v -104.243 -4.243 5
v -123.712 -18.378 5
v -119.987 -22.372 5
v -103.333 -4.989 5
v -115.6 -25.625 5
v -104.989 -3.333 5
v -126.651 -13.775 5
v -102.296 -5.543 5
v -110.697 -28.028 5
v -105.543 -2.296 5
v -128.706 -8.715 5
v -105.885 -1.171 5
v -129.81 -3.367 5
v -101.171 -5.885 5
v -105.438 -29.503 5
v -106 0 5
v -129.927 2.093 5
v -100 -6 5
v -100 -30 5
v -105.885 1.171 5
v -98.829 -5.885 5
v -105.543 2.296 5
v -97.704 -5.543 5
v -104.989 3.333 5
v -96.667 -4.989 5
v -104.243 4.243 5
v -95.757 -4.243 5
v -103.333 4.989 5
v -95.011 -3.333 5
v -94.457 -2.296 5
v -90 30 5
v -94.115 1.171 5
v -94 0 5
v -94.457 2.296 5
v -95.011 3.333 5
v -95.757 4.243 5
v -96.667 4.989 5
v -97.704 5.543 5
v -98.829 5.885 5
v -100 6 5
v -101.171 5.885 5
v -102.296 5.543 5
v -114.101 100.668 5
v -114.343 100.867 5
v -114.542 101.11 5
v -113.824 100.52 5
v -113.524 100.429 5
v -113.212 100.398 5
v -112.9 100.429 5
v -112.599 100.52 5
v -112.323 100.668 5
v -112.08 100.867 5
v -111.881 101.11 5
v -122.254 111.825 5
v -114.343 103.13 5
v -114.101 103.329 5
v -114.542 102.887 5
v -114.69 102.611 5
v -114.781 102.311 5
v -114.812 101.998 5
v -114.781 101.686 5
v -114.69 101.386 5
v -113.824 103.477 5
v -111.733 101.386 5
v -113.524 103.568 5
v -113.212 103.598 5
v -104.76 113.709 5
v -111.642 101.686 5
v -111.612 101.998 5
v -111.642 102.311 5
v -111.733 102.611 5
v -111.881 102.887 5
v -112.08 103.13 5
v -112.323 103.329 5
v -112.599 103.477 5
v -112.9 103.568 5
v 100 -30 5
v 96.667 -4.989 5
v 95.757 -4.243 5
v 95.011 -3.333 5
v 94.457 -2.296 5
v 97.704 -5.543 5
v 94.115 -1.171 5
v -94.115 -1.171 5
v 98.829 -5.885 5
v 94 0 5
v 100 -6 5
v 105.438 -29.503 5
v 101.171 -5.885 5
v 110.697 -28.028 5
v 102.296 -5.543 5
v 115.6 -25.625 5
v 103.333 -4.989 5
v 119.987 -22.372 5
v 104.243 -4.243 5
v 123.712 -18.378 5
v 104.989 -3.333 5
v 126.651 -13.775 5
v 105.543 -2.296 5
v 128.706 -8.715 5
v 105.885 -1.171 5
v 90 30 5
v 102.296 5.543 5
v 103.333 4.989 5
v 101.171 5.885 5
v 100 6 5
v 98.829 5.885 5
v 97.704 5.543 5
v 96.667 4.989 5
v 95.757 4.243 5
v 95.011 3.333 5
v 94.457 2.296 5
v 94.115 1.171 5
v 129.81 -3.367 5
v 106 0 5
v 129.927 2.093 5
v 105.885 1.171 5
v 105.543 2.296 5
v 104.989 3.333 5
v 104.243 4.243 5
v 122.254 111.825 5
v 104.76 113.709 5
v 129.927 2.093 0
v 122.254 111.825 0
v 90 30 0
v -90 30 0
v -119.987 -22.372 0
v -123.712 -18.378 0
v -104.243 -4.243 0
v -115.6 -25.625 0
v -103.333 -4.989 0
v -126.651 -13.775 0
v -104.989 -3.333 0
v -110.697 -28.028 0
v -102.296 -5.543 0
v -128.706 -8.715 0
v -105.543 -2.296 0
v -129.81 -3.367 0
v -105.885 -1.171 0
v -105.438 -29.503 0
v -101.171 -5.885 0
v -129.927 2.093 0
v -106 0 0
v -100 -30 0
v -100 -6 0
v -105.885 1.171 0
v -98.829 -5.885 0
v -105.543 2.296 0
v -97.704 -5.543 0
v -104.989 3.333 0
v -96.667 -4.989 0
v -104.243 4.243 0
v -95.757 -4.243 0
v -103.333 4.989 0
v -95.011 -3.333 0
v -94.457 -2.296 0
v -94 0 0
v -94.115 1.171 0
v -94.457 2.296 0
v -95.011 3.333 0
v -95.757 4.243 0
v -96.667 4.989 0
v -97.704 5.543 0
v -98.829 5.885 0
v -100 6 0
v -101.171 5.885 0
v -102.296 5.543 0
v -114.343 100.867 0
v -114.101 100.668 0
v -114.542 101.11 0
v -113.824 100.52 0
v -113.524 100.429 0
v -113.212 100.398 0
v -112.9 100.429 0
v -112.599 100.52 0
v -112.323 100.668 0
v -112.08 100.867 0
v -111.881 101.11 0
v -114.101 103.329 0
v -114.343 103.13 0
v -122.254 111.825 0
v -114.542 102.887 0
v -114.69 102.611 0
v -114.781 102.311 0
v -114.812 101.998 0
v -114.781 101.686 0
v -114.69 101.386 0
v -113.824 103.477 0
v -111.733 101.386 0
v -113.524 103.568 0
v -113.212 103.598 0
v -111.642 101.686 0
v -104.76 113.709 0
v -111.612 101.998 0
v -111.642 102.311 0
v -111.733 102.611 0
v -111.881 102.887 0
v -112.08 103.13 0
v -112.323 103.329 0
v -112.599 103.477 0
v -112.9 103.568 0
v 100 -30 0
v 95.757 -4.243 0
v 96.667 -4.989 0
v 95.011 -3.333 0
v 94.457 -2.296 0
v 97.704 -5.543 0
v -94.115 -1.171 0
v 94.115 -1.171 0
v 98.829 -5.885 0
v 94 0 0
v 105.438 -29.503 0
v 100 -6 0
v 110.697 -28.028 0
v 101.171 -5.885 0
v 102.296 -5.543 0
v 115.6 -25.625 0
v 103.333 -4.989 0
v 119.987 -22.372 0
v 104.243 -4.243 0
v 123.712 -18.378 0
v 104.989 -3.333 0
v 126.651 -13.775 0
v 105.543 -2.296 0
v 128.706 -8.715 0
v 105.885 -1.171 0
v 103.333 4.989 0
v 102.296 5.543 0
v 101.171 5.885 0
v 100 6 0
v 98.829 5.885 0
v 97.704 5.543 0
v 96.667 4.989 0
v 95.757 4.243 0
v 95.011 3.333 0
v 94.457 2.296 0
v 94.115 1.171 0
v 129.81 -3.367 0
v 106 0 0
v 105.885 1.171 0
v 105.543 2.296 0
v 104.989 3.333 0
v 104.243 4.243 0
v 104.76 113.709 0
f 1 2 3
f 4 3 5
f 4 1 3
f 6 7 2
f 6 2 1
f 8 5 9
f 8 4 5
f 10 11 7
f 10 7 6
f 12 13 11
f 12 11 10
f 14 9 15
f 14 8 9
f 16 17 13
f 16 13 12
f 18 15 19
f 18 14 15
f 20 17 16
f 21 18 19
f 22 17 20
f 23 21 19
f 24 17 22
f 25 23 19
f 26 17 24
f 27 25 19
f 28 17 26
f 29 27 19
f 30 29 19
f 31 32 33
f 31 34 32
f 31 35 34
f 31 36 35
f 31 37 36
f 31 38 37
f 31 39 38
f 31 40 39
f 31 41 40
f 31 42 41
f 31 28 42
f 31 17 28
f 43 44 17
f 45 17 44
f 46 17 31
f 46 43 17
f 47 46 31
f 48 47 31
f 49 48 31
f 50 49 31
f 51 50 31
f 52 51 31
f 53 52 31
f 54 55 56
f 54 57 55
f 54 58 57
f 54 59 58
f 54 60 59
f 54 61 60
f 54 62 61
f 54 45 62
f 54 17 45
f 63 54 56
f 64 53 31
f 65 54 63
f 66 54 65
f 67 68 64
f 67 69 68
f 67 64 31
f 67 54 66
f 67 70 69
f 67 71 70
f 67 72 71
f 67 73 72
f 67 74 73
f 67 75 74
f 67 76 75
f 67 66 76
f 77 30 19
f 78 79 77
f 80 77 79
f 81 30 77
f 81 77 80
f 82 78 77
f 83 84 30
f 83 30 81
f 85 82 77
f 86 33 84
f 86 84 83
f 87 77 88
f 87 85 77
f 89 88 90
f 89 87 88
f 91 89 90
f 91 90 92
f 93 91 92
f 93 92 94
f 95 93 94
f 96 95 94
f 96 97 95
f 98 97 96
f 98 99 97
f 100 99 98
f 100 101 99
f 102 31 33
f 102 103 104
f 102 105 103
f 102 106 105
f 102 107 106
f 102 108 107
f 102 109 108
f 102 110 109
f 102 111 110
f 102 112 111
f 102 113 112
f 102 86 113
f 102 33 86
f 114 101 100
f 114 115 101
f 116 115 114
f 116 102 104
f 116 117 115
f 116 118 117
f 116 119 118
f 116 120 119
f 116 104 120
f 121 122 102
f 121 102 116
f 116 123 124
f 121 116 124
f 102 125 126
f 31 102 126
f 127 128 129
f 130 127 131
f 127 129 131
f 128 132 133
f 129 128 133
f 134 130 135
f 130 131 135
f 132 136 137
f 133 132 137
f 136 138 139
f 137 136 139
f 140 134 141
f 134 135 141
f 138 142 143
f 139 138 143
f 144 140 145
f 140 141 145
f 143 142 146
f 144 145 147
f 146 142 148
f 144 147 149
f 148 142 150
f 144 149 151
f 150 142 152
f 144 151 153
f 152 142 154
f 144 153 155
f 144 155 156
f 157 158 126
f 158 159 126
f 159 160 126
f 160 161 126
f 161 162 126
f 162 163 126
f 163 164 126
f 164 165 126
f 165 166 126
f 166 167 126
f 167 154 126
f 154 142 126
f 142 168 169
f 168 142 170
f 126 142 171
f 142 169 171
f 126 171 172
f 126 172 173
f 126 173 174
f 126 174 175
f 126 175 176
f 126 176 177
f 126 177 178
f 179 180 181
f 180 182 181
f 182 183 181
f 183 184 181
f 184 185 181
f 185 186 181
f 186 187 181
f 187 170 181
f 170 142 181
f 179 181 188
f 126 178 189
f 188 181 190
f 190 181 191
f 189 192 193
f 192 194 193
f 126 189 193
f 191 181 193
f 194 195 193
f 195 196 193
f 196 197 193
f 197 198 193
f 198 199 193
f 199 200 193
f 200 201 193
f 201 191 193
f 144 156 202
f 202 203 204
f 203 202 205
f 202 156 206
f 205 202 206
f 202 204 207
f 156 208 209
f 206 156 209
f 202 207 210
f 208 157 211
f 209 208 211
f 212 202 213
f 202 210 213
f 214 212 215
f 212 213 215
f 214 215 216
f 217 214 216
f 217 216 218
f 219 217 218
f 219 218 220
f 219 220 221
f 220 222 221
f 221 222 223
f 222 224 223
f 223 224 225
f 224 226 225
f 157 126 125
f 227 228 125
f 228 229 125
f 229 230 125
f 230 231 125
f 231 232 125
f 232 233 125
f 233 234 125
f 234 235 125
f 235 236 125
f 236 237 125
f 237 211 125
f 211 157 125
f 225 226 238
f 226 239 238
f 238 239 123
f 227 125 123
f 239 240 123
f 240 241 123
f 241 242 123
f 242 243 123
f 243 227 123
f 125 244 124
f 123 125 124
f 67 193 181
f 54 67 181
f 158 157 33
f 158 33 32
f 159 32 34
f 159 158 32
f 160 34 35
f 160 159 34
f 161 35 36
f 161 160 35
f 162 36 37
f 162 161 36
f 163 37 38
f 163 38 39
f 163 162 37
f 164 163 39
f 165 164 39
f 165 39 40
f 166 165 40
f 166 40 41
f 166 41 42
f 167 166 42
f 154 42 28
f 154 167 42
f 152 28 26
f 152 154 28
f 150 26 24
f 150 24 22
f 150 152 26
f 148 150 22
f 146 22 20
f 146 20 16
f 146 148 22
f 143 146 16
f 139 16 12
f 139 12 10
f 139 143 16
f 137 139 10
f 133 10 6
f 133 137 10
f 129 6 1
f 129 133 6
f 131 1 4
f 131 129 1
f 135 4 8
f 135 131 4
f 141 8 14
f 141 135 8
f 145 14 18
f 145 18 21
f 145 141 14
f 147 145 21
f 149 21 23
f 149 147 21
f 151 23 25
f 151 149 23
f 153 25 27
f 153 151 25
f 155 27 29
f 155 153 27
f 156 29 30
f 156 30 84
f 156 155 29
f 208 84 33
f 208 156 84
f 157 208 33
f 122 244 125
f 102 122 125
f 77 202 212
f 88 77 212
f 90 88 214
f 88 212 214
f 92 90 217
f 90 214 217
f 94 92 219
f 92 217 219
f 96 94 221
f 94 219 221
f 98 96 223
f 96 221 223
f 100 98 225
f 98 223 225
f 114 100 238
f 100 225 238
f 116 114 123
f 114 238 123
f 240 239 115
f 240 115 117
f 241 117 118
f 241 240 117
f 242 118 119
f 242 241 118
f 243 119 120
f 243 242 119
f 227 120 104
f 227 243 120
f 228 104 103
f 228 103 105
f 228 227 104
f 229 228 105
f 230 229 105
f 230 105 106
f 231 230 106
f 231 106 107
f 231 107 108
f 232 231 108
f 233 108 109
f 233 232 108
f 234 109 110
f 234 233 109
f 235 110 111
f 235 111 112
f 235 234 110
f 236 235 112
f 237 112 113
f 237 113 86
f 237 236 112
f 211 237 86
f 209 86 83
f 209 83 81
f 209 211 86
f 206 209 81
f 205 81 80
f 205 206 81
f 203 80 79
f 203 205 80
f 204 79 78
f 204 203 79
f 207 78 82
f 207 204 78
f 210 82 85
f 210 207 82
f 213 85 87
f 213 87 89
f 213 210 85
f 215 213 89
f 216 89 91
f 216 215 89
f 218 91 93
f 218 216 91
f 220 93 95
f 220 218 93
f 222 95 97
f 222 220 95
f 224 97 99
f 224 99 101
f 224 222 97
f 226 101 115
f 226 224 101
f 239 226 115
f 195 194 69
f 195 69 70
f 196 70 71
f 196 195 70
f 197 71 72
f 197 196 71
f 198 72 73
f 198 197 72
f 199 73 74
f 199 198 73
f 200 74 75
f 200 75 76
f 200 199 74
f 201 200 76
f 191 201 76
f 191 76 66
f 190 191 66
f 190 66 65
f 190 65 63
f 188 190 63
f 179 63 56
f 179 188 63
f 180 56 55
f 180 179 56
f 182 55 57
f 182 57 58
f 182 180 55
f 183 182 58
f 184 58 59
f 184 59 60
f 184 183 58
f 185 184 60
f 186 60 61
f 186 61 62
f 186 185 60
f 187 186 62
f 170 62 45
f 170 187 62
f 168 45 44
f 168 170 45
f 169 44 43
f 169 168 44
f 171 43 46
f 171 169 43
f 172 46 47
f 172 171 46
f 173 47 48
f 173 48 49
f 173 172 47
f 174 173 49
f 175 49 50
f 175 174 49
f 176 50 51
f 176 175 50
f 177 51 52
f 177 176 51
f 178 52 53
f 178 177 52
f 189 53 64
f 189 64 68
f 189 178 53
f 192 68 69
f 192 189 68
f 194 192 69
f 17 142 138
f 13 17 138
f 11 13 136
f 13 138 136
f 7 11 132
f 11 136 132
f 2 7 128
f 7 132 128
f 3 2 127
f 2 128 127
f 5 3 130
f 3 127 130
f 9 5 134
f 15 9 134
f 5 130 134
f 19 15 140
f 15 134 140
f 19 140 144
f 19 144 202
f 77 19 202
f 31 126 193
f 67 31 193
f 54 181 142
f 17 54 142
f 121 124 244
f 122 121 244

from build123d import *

# Parameters (mm, degrees)
SKETCH1_R           = 1.6
SKETCH1_R_2         = 6
BOSS_EXTRUDE1_DEPTH = 5


with BuildPart() as part:
    # Sketch1 → Boss-Extrude1 (new body)
    with BuildSketch(Plane.XY):
        with BuildLine():
            Line((90, 30), (-90, 30))
            Line((-90, 30), (-104.760095102, 113.708659006))
            Line((-104.760095102, 113.708659006), (-122.253709396, 111.824739741))
            Line((-122.253709396, 111.824739741), (-129.926921508, 2.092694212))
            ThreePointArc((-129.926921508, 2.092694212), (-121.940611049, -20.459950802), (-100, -30))
            Line((-100, -30), (100, -30))
            ThreePointArc((100, -30), (121.940611049, -20.459950802), (129.926921508, 2.092694212))
            Line((129.926921508, 2.092694212), (122.253709396, 111.824739741))
            Line((122.253709396, 111.824739741), (104.760095102, 113.708659006))
            Line((104.760095102, 113.708659006), (90, 30))
        make_face()
        with Locations((-113.211659227, 101.998451941)):
            Circle(SKETCH1_R, mode=Mode.SUBTRACT)
        with Locations((-100, 0)):
            Circle(SKETCH1_R_2, mode=Mode.SUBTRACT)
        with Locations((100, 0)):
            Circle(SKETCH1_R_2, mode=Mode.SUBTRACT)
    extrude(amount=BOSS_EXTRUDE1_DEPTH)


solid = part.part
